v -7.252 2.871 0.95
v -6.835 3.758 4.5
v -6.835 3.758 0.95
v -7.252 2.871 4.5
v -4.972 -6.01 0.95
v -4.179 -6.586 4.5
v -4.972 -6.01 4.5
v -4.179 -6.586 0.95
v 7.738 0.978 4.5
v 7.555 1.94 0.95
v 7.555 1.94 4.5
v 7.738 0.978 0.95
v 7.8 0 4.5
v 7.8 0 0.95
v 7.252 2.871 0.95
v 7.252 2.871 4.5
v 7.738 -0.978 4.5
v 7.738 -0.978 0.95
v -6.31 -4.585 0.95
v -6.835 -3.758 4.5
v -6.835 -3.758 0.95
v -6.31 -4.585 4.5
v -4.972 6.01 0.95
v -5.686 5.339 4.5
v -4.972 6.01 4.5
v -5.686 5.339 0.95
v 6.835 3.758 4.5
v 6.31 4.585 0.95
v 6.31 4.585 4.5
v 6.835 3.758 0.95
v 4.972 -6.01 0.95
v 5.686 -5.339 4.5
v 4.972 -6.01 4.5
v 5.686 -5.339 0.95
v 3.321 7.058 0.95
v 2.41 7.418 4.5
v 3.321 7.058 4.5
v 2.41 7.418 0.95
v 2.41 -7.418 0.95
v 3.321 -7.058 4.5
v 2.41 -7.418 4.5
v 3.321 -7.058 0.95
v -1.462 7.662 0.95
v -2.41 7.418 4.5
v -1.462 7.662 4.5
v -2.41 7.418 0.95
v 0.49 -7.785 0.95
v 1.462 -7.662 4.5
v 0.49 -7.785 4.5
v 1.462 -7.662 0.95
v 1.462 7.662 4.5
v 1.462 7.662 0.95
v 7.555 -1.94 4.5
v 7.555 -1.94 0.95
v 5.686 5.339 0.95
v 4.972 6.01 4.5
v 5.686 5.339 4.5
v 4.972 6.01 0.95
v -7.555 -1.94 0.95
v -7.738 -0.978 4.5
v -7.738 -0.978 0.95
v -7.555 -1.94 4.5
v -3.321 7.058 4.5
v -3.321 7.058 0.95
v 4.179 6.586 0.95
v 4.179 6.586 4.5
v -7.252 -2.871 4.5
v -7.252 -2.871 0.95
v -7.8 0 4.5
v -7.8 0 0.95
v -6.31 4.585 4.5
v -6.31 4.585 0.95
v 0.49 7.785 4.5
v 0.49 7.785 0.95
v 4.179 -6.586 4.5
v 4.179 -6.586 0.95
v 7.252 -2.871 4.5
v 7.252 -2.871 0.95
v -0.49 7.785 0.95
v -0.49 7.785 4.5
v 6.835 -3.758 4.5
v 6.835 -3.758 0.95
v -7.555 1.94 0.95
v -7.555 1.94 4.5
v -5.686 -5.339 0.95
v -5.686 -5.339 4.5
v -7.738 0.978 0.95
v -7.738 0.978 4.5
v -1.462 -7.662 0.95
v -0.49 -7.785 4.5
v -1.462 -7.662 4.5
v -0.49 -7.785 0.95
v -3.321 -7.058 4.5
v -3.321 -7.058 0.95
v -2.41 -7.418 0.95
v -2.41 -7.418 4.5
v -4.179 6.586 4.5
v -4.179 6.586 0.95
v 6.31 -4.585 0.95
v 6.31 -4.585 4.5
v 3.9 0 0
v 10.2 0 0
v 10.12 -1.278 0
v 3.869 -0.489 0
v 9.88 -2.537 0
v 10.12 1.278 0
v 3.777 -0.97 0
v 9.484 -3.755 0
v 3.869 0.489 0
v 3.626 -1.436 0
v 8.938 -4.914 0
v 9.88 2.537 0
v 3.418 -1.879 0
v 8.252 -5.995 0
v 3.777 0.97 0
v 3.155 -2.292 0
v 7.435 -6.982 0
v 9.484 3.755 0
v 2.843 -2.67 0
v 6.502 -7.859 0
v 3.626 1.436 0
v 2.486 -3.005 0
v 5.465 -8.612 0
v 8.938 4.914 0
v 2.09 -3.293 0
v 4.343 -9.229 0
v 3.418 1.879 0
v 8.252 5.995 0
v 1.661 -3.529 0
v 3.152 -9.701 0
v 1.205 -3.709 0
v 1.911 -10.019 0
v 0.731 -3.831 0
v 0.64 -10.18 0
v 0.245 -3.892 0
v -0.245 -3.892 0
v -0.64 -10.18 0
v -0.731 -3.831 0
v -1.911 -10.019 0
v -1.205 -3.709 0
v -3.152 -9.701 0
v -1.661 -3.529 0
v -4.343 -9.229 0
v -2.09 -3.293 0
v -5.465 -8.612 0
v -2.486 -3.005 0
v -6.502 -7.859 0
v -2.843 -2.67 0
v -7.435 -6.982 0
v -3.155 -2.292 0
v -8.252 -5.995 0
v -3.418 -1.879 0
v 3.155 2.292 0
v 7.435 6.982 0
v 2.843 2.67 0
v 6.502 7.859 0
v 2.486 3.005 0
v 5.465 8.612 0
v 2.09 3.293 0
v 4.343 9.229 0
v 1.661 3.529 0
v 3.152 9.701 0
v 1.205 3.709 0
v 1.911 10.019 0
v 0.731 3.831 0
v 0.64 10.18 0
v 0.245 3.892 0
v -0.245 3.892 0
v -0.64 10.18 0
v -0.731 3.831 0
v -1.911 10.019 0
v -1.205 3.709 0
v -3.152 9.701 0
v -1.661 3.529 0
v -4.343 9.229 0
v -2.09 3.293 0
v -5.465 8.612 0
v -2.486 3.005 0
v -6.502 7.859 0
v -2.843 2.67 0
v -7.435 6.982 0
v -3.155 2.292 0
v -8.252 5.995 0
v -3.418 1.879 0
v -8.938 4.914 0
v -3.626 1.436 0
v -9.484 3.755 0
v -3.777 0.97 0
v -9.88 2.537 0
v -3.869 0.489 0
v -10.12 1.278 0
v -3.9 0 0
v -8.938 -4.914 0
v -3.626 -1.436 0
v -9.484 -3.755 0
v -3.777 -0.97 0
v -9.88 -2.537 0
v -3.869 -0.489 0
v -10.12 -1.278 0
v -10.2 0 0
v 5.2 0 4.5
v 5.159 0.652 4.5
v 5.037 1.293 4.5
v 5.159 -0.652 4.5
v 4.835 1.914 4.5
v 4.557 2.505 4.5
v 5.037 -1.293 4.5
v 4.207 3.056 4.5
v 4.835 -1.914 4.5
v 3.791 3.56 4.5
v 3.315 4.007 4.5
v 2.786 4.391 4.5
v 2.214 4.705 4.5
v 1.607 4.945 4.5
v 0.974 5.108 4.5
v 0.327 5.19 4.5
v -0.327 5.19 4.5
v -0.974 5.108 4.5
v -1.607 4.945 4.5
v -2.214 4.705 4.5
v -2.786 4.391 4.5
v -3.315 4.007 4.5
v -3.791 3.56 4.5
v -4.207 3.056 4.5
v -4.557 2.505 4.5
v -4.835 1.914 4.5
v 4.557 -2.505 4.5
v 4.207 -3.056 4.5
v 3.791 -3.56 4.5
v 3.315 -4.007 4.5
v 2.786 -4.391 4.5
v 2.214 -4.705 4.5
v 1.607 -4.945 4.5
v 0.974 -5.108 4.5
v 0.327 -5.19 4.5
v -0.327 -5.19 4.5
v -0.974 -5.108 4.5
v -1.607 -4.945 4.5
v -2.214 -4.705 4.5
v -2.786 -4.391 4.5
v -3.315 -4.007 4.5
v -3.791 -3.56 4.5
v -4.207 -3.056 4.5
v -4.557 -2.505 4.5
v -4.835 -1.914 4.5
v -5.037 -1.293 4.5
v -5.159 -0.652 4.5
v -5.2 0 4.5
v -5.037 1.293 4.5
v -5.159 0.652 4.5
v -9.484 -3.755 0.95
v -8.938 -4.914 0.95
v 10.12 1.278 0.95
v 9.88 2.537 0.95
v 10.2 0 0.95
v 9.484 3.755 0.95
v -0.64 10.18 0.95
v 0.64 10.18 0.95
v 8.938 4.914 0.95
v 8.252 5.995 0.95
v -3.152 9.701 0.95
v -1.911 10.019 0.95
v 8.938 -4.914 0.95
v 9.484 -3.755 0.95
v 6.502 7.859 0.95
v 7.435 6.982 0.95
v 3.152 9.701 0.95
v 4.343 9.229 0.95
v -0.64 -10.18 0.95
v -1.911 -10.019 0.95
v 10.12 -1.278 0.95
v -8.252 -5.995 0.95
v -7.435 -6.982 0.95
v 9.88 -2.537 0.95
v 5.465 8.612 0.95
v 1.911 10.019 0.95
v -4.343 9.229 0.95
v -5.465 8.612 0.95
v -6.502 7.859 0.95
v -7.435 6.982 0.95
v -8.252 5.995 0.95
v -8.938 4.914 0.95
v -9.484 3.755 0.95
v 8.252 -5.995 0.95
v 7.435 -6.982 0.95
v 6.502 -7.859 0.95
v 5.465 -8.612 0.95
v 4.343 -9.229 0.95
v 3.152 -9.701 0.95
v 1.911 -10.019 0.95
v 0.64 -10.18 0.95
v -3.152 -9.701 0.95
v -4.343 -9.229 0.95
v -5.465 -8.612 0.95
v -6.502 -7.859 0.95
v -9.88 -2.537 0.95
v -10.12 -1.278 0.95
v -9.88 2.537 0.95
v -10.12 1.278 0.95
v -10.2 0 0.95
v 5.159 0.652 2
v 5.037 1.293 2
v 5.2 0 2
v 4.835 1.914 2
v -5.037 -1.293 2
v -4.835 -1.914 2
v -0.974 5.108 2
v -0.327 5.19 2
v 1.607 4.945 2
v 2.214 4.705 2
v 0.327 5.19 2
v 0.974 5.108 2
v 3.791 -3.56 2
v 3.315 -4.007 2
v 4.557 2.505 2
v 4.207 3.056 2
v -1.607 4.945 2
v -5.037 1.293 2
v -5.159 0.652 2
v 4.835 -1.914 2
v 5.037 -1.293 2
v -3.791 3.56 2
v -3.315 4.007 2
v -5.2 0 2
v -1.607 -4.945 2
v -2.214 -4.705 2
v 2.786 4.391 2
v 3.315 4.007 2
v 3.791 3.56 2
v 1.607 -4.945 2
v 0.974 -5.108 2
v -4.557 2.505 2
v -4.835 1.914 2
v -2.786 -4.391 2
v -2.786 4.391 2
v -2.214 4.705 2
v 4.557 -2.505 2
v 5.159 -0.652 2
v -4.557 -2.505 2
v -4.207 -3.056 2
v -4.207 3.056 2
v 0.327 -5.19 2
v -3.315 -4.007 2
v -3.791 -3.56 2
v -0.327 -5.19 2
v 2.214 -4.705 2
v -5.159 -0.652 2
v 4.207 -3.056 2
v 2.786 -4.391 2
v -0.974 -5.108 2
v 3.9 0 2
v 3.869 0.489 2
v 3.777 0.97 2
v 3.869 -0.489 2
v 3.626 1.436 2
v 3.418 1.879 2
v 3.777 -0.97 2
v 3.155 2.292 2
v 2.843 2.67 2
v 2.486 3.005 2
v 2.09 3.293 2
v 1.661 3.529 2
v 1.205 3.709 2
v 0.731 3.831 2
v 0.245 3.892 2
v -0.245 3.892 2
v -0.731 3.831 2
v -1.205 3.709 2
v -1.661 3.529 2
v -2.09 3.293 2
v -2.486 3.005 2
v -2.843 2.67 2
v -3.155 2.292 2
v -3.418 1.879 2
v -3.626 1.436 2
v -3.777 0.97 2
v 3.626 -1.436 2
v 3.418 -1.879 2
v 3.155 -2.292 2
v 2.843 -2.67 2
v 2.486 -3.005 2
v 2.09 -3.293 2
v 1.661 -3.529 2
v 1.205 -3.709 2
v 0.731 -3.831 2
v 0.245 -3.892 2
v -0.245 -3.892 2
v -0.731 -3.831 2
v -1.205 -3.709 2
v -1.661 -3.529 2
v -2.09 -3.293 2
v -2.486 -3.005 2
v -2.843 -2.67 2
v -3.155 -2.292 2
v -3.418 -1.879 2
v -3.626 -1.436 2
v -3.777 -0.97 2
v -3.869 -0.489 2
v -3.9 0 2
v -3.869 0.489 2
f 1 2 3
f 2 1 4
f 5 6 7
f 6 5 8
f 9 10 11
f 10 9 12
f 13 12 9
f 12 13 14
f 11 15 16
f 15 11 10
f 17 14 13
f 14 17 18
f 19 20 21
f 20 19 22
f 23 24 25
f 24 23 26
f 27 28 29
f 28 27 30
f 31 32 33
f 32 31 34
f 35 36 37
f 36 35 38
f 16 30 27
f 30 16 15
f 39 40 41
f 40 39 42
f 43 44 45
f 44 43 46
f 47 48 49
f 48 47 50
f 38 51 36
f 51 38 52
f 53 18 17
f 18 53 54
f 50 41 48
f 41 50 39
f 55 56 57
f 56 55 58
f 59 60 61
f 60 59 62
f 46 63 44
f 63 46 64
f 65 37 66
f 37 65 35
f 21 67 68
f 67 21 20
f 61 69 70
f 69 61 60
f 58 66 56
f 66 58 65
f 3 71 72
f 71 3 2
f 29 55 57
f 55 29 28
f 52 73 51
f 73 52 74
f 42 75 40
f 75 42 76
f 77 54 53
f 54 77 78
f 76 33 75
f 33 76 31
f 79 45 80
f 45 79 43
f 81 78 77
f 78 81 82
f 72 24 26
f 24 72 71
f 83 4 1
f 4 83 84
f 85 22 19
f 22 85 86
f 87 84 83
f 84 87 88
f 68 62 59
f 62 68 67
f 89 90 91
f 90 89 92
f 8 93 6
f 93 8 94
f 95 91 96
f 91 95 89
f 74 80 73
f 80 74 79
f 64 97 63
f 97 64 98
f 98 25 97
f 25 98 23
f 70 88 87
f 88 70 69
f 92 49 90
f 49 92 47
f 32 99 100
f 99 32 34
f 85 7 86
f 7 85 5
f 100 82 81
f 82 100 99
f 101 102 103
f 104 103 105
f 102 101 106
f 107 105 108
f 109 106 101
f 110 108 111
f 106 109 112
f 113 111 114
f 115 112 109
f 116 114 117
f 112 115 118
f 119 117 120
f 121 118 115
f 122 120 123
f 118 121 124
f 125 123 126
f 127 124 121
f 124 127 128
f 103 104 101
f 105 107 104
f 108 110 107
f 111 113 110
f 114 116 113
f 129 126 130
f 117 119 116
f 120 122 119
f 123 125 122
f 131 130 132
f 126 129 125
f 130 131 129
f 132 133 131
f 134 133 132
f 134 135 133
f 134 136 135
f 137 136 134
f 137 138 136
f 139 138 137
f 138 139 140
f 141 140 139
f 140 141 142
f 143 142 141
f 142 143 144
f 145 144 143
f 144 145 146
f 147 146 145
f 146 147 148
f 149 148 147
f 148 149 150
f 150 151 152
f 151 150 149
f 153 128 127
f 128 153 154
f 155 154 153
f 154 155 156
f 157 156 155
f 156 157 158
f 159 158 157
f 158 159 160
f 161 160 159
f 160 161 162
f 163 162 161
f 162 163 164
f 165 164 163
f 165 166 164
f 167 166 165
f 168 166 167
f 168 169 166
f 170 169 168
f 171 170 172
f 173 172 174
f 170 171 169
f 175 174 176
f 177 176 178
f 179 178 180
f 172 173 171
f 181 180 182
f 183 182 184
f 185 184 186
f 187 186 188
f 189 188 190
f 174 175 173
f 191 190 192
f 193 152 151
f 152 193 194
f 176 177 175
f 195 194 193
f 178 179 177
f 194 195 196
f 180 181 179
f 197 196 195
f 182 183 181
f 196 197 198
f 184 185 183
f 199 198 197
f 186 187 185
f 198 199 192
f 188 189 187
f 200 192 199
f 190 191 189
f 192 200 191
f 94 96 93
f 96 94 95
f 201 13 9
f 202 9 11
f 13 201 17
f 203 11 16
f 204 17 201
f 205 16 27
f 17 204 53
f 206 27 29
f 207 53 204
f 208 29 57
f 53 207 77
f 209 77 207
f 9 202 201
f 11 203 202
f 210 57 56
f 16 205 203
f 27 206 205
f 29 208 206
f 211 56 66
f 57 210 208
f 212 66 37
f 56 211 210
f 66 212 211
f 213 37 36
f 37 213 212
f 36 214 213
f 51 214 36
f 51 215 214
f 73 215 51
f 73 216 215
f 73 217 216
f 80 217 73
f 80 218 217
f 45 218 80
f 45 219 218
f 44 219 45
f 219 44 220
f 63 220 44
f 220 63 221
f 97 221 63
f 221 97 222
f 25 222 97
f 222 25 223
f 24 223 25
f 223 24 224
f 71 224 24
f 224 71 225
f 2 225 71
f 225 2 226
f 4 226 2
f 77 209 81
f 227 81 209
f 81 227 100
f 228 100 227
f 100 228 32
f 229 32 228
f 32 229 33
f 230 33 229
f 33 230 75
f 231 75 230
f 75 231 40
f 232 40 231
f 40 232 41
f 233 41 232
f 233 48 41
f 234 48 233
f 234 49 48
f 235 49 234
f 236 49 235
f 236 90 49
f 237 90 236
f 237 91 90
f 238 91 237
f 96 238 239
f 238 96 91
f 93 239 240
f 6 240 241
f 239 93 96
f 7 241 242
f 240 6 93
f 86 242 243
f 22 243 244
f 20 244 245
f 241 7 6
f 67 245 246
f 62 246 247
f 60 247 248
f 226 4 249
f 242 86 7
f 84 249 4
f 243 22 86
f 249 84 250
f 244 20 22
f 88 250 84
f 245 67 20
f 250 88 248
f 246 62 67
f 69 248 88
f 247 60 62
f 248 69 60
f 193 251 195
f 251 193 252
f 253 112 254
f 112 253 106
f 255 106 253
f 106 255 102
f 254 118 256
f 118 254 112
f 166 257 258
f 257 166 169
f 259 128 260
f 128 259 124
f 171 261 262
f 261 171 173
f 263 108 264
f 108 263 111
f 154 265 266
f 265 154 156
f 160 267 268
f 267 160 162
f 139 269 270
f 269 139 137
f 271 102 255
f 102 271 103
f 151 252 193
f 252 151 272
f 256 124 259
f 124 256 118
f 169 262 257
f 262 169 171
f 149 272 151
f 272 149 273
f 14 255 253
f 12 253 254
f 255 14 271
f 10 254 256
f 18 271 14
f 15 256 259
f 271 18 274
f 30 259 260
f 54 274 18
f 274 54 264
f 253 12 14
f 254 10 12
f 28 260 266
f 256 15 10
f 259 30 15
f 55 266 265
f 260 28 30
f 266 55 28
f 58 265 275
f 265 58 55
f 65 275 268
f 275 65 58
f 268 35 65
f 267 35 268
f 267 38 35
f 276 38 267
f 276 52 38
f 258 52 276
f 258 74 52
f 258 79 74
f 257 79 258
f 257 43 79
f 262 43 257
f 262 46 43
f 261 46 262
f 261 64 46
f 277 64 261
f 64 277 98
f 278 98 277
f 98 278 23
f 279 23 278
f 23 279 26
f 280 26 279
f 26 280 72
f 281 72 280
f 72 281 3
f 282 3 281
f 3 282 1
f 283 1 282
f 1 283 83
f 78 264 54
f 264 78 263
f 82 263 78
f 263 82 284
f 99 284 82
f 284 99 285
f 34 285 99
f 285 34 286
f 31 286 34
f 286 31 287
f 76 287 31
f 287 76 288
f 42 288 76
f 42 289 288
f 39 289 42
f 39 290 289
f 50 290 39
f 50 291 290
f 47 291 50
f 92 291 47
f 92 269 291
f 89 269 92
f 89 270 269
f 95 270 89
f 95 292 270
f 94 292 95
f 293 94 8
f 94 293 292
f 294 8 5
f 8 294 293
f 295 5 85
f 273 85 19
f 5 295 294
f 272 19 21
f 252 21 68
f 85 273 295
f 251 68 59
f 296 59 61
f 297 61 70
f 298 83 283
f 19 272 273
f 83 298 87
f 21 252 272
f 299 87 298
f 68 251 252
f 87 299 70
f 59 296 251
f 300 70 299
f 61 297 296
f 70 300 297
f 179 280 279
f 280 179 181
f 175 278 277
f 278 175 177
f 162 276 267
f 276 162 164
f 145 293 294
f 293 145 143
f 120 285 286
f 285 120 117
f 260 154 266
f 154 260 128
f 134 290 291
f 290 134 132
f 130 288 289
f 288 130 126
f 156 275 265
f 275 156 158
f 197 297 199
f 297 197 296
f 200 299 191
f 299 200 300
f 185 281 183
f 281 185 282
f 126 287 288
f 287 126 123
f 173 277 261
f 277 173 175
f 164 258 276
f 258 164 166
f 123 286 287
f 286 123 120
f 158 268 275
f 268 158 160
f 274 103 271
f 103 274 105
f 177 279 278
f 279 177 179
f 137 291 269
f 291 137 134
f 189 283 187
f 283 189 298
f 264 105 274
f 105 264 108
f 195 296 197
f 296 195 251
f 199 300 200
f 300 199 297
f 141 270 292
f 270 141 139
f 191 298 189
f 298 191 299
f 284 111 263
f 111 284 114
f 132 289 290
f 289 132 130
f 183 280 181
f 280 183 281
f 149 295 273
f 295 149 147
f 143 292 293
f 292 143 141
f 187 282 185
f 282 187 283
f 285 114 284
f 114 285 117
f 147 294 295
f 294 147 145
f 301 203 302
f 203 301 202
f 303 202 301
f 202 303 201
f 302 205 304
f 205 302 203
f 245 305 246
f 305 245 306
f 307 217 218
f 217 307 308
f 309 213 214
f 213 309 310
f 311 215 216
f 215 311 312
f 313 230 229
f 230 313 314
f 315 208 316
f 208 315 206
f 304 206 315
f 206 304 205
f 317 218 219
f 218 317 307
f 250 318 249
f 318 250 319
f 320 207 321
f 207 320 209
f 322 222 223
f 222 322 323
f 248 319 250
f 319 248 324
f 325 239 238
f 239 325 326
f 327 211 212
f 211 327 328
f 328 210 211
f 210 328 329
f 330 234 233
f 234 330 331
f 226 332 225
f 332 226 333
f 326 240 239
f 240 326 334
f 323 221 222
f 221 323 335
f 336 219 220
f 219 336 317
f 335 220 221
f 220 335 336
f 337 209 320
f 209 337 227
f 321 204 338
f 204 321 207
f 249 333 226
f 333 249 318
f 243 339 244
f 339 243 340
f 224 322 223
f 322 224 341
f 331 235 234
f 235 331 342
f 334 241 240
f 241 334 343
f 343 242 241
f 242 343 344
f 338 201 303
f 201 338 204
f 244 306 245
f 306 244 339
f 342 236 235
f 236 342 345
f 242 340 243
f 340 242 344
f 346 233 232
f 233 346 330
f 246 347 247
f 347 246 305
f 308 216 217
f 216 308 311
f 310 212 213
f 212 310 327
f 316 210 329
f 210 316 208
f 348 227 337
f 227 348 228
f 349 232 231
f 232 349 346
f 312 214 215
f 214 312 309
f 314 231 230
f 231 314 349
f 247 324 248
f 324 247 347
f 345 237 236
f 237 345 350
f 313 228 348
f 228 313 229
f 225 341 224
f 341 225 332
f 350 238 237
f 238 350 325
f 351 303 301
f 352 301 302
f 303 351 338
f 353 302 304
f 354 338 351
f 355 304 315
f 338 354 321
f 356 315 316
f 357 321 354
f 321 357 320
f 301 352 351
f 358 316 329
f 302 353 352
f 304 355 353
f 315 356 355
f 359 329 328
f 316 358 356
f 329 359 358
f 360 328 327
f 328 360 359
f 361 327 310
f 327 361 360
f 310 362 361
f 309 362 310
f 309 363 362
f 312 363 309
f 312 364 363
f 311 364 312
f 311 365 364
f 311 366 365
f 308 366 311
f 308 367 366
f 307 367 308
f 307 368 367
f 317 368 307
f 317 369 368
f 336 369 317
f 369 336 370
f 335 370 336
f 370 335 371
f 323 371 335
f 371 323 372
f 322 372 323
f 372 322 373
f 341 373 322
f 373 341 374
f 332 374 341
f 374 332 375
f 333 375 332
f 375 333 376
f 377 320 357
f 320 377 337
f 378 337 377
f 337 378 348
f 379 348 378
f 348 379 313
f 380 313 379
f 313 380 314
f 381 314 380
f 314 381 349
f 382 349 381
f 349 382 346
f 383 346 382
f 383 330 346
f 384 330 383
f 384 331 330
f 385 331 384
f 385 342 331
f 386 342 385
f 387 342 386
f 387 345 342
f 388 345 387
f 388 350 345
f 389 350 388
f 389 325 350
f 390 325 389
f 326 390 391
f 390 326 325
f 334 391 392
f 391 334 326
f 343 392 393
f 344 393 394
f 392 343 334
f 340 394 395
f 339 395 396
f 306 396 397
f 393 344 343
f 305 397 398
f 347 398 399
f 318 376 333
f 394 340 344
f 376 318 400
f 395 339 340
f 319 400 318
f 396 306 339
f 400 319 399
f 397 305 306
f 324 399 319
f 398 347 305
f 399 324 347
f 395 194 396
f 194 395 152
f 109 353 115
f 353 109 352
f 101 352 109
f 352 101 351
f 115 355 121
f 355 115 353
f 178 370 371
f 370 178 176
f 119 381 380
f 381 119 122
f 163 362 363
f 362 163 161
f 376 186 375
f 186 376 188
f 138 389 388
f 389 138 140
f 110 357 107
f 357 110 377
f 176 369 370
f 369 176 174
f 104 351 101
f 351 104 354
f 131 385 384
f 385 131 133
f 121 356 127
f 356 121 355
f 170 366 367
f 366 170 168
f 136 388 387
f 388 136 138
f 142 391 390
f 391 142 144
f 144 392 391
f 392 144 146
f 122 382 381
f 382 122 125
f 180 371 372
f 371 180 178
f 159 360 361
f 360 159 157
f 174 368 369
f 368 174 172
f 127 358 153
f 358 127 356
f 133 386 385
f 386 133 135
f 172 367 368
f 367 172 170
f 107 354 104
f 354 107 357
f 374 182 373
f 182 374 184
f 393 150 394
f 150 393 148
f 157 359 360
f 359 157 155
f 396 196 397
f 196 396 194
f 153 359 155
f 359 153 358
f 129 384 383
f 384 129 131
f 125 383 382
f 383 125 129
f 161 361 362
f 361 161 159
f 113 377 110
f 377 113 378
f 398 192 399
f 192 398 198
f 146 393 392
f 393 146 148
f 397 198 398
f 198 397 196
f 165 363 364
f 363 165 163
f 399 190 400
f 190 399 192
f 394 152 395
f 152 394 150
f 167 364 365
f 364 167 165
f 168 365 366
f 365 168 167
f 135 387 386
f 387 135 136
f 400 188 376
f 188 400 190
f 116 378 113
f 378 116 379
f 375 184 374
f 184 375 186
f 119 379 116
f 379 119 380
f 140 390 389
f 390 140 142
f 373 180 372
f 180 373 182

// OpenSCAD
// PRUSA iteration3
// 624 bearing belt guide
// GNU GPL v3
// Josef Průša <iam@josefprusa.cz> and contributors
// http://www.reprap.org/wiki/Prusa_Mendel
// http://prusamendel.org

wall= 1.2;
clearence= 0.1; 

module belt_guide_base(){
 cylinder(r=6.5+wall+clearence, h=5-0.5, $fn=50);
 cylinder(r=6.5+wall+clearence+2*wall, h=0.95, $fn=50);
}

module belt_guide_holes(){
 translate([0,0,2]) cylinder(r=5.1+clearence, h=10, $fn=50);
 translate([0,0,-1]) cylinder(r=5+wall+clearence-2*wall, h=10, $fn=50);
}

// Final part
module belt_guide(){
 difference(){
  belt_guide_base();
  belt_guide_holes();
 }
}

belt_guide();
